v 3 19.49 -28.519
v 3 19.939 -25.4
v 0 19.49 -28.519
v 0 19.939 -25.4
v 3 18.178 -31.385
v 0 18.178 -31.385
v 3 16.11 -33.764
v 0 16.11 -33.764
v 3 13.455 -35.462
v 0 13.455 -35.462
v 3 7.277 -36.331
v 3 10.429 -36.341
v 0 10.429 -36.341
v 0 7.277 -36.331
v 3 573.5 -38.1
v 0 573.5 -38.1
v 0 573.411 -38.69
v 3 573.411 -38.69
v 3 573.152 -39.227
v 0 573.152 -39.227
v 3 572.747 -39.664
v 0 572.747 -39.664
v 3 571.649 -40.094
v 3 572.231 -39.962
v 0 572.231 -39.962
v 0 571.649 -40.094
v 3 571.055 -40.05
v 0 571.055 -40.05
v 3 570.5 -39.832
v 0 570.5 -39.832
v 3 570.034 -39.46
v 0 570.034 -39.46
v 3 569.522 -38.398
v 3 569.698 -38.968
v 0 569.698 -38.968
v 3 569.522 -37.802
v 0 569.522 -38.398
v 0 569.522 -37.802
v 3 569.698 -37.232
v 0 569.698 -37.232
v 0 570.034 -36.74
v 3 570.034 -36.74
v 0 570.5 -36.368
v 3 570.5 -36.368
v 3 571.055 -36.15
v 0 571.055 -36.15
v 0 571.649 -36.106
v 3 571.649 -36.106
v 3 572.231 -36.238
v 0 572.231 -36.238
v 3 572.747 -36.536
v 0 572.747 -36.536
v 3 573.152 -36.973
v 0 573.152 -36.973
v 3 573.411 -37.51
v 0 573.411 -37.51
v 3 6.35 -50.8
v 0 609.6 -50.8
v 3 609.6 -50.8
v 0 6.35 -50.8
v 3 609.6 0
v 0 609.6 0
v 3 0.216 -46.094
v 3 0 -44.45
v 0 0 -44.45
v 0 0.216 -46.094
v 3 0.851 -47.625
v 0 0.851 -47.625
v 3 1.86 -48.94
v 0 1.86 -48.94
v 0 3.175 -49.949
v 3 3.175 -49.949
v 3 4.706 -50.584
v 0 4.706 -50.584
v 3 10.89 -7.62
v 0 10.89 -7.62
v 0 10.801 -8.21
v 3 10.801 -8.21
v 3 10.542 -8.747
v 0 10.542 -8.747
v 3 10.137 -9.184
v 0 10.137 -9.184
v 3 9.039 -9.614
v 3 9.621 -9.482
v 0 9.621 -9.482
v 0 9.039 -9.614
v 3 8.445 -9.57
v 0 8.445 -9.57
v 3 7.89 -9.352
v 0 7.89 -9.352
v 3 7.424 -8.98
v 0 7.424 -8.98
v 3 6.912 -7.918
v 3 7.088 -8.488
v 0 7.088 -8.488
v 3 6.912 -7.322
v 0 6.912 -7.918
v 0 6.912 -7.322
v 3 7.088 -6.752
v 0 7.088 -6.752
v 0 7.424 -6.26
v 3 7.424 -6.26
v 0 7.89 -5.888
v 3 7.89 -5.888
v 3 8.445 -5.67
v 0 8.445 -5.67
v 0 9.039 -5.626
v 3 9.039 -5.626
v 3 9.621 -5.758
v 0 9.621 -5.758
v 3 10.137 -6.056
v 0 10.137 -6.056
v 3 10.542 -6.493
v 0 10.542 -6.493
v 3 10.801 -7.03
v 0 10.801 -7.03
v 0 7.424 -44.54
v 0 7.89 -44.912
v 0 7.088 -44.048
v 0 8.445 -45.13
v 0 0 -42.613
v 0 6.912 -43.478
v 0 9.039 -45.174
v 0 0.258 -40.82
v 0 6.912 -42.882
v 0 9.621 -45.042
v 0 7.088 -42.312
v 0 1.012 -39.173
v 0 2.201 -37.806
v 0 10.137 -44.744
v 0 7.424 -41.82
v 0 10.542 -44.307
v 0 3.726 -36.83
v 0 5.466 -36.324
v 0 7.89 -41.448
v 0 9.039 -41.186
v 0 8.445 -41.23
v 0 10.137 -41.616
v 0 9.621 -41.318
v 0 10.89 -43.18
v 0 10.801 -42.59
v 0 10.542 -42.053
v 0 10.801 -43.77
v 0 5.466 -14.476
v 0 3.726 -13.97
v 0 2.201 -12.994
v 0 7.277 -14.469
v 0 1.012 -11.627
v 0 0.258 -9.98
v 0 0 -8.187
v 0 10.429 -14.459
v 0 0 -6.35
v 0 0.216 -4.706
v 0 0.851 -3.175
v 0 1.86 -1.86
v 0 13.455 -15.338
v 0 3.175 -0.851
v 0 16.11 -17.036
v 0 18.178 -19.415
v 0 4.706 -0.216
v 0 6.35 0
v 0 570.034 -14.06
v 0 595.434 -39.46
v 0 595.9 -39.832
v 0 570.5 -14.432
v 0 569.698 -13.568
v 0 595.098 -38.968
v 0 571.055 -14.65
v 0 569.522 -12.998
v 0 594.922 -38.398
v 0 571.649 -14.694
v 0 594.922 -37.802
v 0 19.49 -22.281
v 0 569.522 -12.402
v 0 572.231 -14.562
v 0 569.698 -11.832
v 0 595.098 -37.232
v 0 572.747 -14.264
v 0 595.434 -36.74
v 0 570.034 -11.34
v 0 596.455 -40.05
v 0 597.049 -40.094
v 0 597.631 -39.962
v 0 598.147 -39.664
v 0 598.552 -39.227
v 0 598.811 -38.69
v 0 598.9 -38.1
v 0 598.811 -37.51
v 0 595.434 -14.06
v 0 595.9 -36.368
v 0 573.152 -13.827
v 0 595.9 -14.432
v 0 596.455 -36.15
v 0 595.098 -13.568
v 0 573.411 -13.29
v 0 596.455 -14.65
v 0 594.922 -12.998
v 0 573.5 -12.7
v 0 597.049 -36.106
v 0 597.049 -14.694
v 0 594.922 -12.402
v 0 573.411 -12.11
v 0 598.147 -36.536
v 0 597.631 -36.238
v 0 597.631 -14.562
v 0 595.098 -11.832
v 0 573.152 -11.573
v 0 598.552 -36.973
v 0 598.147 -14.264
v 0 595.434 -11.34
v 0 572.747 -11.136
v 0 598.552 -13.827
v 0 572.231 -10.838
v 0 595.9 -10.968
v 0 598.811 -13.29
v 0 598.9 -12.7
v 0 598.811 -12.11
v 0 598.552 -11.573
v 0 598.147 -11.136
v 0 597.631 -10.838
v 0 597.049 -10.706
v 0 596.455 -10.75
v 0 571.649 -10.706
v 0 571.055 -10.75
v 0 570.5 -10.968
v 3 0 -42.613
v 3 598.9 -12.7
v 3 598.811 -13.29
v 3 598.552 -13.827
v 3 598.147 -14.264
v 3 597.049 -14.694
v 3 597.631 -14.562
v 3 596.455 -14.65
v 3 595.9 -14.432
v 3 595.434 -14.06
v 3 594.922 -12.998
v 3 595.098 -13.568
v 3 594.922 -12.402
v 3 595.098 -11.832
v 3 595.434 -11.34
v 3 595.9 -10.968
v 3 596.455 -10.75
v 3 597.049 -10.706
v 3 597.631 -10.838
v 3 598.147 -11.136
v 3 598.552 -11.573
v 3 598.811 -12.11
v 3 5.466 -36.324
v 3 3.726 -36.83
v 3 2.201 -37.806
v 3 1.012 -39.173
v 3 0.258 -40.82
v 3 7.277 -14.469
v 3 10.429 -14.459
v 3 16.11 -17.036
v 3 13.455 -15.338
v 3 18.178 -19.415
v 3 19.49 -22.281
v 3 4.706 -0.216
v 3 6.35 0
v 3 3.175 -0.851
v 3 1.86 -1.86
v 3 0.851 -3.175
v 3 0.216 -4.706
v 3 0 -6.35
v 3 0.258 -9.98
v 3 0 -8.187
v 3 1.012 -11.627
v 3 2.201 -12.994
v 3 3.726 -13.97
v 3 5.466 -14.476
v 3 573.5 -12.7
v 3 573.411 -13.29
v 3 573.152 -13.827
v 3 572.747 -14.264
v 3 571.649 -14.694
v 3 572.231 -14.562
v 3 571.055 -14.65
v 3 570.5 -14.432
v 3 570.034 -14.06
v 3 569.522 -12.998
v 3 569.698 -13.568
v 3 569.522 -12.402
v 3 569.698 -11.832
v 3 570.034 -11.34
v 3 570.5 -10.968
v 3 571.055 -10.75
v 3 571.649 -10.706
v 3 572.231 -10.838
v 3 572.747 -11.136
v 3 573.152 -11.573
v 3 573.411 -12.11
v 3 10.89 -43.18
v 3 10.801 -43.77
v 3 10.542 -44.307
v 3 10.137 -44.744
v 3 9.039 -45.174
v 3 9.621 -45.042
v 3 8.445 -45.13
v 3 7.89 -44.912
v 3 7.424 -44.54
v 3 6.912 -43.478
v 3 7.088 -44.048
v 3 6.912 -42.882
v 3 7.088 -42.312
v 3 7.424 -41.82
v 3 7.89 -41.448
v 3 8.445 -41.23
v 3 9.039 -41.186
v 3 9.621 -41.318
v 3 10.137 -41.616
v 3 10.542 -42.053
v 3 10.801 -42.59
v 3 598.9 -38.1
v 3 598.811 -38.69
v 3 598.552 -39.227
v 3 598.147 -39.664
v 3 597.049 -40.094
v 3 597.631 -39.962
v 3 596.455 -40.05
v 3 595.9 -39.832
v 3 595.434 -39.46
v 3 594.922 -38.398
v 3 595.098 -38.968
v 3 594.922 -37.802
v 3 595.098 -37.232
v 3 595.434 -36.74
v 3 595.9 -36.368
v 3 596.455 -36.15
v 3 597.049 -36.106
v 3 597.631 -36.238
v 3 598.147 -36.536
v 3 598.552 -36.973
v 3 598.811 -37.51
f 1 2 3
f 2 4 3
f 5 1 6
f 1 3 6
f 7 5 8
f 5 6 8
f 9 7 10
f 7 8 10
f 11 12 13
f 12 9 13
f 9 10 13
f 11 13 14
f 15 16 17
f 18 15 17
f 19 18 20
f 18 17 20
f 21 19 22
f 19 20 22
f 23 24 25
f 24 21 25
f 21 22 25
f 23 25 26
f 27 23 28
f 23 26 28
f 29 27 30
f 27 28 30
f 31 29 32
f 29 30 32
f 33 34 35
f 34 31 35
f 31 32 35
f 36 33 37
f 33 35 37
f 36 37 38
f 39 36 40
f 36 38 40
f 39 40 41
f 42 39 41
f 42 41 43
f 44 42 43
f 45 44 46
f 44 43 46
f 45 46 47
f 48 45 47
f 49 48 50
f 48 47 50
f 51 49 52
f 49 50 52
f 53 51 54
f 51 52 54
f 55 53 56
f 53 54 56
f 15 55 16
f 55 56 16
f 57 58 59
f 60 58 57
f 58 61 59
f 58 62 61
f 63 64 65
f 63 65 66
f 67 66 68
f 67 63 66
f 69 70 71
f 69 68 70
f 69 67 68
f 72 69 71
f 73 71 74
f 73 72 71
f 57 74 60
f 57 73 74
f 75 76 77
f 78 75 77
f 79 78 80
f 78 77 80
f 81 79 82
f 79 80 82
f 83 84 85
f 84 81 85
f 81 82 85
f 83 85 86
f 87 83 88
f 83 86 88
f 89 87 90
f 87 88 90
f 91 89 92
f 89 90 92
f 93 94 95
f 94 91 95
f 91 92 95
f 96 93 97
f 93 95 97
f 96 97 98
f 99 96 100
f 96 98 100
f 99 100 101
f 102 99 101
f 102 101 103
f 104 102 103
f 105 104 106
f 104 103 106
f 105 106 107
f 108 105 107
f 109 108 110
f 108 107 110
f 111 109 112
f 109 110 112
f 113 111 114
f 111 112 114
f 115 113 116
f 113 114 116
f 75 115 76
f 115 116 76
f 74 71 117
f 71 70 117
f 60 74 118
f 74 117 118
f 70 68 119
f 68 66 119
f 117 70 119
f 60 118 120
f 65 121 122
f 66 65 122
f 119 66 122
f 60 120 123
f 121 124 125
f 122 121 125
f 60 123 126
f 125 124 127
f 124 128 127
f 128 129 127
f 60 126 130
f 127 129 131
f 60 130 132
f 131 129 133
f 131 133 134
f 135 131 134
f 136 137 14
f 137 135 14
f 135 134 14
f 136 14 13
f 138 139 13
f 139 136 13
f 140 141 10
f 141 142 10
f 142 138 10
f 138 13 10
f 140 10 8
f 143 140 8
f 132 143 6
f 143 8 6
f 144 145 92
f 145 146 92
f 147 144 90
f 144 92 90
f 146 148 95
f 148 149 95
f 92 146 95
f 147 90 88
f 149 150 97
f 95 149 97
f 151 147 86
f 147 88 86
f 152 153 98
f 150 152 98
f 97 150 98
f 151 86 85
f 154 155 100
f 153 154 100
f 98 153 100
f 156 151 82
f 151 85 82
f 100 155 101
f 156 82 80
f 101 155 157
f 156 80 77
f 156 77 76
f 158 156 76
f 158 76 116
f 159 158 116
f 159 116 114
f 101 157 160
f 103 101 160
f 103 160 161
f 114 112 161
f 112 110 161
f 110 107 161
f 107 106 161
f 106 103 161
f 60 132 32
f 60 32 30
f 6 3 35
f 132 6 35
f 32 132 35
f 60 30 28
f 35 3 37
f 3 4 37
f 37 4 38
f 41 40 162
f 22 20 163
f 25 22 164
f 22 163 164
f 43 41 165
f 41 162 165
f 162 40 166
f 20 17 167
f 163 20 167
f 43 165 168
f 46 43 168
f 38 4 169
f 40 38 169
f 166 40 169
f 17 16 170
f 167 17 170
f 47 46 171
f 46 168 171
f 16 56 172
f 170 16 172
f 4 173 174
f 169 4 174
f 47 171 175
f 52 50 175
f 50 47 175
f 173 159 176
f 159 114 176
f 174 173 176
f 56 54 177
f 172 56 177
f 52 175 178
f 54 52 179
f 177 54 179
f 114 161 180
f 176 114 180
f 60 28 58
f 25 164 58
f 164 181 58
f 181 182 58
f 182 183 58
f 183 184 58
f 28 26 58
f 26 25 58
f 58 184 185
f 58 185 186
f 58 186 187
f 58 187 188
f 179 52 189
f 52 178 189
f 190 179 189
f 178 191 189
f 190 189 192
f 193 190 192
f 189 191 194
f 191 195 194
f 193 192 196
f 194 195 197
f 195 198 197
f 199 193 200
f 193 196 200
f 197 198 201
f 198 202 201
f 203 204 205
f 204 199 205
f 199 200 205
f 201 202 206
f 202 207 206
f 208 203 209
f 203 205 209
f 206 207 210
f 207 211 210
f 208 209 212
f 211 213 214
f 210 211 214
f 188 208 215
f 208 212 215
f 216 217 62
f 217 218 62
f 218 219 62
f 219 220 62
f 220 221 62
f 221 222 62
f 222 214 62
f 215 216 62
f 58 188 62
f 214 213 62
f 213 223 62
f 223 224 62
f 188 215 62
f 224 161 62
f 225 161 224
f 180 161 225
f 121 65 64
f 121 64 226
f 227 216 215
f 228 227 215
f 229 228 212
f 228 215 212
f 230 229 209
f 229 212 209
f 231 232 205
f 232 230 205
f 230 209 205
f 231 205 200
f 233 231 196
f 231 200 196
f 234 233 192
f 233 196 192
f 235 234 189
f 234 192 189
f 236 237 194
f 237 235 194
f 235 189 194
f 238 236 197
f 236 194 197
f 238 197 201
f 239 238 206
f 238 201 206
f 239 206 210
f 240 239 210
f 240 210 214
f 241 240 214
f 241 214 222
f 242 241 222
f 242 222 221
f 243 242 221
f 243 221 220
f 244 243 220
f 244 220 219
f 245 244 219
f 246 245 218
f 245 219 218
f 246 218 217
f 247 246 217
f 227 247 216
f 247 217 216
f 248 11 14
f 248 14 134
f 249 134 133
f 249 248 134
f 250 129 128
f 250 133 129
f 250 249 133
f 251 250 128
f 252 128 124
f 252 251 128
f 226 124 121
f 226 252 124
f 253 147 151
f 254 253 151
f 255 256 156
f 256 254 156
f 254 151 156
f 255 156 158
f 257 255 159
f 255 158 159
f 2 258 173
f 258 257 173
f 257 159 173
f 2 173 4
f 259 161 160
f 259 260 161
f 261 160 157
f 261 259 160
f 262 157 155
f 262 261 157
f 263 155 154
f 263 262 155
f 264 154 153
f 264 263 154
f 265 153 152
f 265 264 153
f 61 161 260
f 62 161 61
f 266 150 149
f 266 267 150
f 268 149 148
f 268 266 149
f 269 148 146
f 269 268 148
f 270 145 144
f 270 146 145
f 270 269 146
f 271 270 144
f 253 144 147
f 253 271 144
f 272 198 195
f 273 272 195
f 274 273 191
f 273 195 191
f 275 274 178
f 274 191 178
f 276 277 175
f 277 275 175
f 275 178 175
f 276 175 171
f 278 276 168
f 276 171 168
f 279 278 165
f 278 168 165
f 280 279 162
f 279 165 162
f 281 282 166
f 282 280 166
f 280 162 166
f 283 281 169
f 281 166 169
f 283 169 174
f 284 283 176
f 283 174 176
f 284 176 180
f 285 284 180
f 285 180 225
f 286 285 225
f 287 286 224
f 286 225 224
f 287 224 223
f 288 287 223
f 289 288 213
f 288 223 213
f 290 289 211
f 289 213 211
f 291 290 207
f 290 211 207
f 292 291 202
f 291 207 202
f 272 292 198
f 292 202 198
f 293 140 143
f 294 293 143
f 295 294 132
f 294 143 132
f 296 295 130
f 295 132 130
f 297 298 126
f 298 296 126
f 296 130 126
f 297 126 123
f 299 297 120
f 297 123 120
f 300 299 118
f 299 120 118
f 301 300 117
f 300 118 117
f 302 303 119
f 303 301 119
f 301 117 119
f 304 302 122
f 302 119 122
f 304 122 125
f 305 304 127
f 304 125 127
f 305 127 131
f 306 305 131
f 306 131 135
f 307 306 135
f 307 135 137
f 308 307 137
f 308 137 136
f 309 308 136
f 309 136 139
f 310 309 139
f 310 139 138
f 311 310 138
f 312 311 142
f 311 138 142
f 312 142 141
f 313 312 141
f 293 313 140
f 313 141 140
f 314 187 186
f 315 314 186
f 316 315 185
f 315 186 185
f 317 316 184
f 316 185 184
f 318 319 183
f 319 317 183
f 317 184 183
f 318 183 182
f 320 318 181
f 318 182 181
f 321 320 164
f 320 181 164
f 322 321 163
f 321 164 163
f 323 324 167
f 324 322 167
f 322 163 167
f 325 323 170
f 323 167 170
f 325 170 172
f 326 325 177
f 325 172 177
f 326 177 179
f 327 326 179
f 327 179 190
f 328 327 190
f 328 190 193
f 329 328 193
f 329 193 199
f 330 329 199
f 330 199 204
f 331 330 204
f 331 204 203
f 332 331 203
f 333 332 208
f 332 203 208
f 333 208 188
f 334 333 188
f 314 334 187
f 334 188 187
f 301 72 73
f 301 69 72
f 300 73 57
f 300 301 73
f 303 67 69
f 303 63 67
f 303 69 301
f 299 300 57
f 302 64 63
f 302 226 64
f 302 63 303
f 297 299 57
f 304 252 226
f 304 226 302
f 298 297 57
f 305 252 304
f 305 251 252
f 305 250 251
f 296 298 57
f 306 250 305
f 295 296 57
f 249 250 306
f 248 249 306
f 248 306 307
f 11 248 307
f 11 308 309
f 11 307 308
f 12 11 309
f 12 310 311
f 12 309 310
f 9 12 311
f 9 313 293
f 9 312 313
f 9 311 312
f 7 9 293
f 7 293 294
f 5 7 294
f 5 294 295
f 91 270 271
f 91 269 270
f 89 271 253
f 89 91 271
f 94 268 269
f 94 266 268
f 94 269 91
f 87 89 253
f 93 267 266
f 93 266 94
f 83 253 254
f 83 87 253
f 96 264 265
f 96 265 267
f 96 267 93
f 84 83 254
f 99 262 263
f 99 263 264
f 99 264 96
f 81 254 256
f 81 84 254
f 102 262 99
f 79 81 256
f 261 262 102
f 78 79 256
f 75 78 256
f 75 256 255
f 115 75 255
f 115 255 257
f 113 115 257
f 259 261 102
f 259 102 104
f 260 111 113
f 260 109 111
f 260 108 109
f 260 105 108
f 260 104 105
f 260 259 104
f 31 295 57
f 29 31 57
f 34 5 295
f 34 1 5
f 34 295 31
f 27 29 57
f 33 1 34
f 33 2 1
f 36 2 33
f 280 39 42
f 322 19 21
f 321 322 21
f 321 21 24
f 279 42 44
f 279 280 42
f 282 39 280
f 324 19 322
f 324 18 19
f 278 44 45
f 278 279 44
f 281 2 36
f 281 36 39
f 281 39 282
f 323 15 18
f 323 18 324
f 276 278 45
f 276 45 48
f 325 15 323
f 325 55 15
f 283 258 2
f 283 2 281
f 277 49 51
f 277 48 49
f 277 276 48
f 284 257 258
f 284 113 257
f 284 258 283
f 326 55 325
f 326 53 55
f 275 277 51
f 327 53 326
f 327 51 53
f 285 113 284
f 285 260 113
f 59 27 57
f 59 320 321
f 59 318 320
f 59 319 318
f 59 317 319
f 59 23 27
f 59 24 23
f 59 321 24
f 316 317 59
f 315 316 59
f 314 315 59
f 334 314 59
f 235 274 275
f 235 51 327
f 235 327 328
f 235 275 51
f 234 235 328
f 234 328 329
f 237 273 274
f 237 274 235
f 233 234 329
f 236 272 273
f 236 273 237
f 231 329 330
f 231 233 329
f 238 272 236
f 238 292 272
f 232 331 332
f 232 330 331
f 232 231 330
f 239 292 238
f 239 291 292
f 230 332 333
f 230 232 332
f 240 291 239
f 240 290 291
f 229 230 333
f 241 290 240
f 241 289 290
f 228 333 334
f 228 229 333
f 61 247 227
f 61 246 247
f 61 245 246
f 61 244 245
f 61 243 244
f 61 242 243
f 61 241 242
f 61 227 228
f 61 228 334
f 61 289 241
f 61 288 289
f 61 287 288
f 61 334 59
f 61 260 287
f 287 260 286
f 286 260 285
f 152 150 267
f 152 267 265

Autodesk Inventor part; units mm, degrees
ref_plane "YZ Plane" through (0, 0, 0) normal (1, 0, 0) x (0, 1, 0)
ref_plane "XZ Plane" through (0, 0, 0) normal (0, 1, 0) x (-1, 0, 0)
ref_plane "XY Plane" through (0, 0, 0) normal (0, 0, 1) x (1, 0, 0)
sketch "Sketch1" plane through (0, 0, 0) normal (1, 0, 0) x (0, 1, 0)
  line L0 (0, 0) -> (609.6, 0)
  line L1 (609.6, 0) -> (609.6, -50.8)
  line L2 (609.6, -50.8) -> (0, -50.8)
  line L3 (0, -50.8) -> (0, 0)
  circle A0 centre (8.89, -25.4) radius 11.049
  circle A1 centre (8.89, -7.62) radius 2
  circle A2 centre (8.89, -43.18) radius 2
  circle A3 centre (596.9, -12.7) radius 2
  circle A4 centre (596.9, -38.1) radius 2
  circle A5 centre (571.5, -12.7) radius 2
  circle A6 centre (571.5, -38.1) radius 2
  point P0 (0, -25.4)
  point P1 (0, -18.8389)
  point P2 (0, -31.9611)
  dimension "d0" = 609.6
  dimension "d1" = 50.8
  dimension "d2" = 22.098
  dimension "d3" = 8.89
  dimension "d4" = 4
  dimension "d5" = 4
  dimension "d6" = 7.62
  dimension "d7" = 8.89
  dimension "d8" = 7.62
  dimension "d9" = 8.89
  dimension "d10" = 4
  dimension "d11" = 4
  dimension "d12" = 4
  dimension "d13" = 4
  dimension "d14" = 25.4
  dimension "d15" = 25.4
  dimension "d16" = 25.4
  dimension "d17" = 25.4
  dimension "d18" = 12.7
  dimension "d19" = 12.7
extrude "Extrusion1" add sketch "Sketch1" along normal blind 3 contours L0 L1 L2 L3 A0
fillet "Fillet1" radius 6.35 4 edges at (1.5, 0, -31.9611) (1.5, 0, -18.8389) (1.5, 0, 0) (1.5, 0, -50.8)
properties part number "DropBar"
